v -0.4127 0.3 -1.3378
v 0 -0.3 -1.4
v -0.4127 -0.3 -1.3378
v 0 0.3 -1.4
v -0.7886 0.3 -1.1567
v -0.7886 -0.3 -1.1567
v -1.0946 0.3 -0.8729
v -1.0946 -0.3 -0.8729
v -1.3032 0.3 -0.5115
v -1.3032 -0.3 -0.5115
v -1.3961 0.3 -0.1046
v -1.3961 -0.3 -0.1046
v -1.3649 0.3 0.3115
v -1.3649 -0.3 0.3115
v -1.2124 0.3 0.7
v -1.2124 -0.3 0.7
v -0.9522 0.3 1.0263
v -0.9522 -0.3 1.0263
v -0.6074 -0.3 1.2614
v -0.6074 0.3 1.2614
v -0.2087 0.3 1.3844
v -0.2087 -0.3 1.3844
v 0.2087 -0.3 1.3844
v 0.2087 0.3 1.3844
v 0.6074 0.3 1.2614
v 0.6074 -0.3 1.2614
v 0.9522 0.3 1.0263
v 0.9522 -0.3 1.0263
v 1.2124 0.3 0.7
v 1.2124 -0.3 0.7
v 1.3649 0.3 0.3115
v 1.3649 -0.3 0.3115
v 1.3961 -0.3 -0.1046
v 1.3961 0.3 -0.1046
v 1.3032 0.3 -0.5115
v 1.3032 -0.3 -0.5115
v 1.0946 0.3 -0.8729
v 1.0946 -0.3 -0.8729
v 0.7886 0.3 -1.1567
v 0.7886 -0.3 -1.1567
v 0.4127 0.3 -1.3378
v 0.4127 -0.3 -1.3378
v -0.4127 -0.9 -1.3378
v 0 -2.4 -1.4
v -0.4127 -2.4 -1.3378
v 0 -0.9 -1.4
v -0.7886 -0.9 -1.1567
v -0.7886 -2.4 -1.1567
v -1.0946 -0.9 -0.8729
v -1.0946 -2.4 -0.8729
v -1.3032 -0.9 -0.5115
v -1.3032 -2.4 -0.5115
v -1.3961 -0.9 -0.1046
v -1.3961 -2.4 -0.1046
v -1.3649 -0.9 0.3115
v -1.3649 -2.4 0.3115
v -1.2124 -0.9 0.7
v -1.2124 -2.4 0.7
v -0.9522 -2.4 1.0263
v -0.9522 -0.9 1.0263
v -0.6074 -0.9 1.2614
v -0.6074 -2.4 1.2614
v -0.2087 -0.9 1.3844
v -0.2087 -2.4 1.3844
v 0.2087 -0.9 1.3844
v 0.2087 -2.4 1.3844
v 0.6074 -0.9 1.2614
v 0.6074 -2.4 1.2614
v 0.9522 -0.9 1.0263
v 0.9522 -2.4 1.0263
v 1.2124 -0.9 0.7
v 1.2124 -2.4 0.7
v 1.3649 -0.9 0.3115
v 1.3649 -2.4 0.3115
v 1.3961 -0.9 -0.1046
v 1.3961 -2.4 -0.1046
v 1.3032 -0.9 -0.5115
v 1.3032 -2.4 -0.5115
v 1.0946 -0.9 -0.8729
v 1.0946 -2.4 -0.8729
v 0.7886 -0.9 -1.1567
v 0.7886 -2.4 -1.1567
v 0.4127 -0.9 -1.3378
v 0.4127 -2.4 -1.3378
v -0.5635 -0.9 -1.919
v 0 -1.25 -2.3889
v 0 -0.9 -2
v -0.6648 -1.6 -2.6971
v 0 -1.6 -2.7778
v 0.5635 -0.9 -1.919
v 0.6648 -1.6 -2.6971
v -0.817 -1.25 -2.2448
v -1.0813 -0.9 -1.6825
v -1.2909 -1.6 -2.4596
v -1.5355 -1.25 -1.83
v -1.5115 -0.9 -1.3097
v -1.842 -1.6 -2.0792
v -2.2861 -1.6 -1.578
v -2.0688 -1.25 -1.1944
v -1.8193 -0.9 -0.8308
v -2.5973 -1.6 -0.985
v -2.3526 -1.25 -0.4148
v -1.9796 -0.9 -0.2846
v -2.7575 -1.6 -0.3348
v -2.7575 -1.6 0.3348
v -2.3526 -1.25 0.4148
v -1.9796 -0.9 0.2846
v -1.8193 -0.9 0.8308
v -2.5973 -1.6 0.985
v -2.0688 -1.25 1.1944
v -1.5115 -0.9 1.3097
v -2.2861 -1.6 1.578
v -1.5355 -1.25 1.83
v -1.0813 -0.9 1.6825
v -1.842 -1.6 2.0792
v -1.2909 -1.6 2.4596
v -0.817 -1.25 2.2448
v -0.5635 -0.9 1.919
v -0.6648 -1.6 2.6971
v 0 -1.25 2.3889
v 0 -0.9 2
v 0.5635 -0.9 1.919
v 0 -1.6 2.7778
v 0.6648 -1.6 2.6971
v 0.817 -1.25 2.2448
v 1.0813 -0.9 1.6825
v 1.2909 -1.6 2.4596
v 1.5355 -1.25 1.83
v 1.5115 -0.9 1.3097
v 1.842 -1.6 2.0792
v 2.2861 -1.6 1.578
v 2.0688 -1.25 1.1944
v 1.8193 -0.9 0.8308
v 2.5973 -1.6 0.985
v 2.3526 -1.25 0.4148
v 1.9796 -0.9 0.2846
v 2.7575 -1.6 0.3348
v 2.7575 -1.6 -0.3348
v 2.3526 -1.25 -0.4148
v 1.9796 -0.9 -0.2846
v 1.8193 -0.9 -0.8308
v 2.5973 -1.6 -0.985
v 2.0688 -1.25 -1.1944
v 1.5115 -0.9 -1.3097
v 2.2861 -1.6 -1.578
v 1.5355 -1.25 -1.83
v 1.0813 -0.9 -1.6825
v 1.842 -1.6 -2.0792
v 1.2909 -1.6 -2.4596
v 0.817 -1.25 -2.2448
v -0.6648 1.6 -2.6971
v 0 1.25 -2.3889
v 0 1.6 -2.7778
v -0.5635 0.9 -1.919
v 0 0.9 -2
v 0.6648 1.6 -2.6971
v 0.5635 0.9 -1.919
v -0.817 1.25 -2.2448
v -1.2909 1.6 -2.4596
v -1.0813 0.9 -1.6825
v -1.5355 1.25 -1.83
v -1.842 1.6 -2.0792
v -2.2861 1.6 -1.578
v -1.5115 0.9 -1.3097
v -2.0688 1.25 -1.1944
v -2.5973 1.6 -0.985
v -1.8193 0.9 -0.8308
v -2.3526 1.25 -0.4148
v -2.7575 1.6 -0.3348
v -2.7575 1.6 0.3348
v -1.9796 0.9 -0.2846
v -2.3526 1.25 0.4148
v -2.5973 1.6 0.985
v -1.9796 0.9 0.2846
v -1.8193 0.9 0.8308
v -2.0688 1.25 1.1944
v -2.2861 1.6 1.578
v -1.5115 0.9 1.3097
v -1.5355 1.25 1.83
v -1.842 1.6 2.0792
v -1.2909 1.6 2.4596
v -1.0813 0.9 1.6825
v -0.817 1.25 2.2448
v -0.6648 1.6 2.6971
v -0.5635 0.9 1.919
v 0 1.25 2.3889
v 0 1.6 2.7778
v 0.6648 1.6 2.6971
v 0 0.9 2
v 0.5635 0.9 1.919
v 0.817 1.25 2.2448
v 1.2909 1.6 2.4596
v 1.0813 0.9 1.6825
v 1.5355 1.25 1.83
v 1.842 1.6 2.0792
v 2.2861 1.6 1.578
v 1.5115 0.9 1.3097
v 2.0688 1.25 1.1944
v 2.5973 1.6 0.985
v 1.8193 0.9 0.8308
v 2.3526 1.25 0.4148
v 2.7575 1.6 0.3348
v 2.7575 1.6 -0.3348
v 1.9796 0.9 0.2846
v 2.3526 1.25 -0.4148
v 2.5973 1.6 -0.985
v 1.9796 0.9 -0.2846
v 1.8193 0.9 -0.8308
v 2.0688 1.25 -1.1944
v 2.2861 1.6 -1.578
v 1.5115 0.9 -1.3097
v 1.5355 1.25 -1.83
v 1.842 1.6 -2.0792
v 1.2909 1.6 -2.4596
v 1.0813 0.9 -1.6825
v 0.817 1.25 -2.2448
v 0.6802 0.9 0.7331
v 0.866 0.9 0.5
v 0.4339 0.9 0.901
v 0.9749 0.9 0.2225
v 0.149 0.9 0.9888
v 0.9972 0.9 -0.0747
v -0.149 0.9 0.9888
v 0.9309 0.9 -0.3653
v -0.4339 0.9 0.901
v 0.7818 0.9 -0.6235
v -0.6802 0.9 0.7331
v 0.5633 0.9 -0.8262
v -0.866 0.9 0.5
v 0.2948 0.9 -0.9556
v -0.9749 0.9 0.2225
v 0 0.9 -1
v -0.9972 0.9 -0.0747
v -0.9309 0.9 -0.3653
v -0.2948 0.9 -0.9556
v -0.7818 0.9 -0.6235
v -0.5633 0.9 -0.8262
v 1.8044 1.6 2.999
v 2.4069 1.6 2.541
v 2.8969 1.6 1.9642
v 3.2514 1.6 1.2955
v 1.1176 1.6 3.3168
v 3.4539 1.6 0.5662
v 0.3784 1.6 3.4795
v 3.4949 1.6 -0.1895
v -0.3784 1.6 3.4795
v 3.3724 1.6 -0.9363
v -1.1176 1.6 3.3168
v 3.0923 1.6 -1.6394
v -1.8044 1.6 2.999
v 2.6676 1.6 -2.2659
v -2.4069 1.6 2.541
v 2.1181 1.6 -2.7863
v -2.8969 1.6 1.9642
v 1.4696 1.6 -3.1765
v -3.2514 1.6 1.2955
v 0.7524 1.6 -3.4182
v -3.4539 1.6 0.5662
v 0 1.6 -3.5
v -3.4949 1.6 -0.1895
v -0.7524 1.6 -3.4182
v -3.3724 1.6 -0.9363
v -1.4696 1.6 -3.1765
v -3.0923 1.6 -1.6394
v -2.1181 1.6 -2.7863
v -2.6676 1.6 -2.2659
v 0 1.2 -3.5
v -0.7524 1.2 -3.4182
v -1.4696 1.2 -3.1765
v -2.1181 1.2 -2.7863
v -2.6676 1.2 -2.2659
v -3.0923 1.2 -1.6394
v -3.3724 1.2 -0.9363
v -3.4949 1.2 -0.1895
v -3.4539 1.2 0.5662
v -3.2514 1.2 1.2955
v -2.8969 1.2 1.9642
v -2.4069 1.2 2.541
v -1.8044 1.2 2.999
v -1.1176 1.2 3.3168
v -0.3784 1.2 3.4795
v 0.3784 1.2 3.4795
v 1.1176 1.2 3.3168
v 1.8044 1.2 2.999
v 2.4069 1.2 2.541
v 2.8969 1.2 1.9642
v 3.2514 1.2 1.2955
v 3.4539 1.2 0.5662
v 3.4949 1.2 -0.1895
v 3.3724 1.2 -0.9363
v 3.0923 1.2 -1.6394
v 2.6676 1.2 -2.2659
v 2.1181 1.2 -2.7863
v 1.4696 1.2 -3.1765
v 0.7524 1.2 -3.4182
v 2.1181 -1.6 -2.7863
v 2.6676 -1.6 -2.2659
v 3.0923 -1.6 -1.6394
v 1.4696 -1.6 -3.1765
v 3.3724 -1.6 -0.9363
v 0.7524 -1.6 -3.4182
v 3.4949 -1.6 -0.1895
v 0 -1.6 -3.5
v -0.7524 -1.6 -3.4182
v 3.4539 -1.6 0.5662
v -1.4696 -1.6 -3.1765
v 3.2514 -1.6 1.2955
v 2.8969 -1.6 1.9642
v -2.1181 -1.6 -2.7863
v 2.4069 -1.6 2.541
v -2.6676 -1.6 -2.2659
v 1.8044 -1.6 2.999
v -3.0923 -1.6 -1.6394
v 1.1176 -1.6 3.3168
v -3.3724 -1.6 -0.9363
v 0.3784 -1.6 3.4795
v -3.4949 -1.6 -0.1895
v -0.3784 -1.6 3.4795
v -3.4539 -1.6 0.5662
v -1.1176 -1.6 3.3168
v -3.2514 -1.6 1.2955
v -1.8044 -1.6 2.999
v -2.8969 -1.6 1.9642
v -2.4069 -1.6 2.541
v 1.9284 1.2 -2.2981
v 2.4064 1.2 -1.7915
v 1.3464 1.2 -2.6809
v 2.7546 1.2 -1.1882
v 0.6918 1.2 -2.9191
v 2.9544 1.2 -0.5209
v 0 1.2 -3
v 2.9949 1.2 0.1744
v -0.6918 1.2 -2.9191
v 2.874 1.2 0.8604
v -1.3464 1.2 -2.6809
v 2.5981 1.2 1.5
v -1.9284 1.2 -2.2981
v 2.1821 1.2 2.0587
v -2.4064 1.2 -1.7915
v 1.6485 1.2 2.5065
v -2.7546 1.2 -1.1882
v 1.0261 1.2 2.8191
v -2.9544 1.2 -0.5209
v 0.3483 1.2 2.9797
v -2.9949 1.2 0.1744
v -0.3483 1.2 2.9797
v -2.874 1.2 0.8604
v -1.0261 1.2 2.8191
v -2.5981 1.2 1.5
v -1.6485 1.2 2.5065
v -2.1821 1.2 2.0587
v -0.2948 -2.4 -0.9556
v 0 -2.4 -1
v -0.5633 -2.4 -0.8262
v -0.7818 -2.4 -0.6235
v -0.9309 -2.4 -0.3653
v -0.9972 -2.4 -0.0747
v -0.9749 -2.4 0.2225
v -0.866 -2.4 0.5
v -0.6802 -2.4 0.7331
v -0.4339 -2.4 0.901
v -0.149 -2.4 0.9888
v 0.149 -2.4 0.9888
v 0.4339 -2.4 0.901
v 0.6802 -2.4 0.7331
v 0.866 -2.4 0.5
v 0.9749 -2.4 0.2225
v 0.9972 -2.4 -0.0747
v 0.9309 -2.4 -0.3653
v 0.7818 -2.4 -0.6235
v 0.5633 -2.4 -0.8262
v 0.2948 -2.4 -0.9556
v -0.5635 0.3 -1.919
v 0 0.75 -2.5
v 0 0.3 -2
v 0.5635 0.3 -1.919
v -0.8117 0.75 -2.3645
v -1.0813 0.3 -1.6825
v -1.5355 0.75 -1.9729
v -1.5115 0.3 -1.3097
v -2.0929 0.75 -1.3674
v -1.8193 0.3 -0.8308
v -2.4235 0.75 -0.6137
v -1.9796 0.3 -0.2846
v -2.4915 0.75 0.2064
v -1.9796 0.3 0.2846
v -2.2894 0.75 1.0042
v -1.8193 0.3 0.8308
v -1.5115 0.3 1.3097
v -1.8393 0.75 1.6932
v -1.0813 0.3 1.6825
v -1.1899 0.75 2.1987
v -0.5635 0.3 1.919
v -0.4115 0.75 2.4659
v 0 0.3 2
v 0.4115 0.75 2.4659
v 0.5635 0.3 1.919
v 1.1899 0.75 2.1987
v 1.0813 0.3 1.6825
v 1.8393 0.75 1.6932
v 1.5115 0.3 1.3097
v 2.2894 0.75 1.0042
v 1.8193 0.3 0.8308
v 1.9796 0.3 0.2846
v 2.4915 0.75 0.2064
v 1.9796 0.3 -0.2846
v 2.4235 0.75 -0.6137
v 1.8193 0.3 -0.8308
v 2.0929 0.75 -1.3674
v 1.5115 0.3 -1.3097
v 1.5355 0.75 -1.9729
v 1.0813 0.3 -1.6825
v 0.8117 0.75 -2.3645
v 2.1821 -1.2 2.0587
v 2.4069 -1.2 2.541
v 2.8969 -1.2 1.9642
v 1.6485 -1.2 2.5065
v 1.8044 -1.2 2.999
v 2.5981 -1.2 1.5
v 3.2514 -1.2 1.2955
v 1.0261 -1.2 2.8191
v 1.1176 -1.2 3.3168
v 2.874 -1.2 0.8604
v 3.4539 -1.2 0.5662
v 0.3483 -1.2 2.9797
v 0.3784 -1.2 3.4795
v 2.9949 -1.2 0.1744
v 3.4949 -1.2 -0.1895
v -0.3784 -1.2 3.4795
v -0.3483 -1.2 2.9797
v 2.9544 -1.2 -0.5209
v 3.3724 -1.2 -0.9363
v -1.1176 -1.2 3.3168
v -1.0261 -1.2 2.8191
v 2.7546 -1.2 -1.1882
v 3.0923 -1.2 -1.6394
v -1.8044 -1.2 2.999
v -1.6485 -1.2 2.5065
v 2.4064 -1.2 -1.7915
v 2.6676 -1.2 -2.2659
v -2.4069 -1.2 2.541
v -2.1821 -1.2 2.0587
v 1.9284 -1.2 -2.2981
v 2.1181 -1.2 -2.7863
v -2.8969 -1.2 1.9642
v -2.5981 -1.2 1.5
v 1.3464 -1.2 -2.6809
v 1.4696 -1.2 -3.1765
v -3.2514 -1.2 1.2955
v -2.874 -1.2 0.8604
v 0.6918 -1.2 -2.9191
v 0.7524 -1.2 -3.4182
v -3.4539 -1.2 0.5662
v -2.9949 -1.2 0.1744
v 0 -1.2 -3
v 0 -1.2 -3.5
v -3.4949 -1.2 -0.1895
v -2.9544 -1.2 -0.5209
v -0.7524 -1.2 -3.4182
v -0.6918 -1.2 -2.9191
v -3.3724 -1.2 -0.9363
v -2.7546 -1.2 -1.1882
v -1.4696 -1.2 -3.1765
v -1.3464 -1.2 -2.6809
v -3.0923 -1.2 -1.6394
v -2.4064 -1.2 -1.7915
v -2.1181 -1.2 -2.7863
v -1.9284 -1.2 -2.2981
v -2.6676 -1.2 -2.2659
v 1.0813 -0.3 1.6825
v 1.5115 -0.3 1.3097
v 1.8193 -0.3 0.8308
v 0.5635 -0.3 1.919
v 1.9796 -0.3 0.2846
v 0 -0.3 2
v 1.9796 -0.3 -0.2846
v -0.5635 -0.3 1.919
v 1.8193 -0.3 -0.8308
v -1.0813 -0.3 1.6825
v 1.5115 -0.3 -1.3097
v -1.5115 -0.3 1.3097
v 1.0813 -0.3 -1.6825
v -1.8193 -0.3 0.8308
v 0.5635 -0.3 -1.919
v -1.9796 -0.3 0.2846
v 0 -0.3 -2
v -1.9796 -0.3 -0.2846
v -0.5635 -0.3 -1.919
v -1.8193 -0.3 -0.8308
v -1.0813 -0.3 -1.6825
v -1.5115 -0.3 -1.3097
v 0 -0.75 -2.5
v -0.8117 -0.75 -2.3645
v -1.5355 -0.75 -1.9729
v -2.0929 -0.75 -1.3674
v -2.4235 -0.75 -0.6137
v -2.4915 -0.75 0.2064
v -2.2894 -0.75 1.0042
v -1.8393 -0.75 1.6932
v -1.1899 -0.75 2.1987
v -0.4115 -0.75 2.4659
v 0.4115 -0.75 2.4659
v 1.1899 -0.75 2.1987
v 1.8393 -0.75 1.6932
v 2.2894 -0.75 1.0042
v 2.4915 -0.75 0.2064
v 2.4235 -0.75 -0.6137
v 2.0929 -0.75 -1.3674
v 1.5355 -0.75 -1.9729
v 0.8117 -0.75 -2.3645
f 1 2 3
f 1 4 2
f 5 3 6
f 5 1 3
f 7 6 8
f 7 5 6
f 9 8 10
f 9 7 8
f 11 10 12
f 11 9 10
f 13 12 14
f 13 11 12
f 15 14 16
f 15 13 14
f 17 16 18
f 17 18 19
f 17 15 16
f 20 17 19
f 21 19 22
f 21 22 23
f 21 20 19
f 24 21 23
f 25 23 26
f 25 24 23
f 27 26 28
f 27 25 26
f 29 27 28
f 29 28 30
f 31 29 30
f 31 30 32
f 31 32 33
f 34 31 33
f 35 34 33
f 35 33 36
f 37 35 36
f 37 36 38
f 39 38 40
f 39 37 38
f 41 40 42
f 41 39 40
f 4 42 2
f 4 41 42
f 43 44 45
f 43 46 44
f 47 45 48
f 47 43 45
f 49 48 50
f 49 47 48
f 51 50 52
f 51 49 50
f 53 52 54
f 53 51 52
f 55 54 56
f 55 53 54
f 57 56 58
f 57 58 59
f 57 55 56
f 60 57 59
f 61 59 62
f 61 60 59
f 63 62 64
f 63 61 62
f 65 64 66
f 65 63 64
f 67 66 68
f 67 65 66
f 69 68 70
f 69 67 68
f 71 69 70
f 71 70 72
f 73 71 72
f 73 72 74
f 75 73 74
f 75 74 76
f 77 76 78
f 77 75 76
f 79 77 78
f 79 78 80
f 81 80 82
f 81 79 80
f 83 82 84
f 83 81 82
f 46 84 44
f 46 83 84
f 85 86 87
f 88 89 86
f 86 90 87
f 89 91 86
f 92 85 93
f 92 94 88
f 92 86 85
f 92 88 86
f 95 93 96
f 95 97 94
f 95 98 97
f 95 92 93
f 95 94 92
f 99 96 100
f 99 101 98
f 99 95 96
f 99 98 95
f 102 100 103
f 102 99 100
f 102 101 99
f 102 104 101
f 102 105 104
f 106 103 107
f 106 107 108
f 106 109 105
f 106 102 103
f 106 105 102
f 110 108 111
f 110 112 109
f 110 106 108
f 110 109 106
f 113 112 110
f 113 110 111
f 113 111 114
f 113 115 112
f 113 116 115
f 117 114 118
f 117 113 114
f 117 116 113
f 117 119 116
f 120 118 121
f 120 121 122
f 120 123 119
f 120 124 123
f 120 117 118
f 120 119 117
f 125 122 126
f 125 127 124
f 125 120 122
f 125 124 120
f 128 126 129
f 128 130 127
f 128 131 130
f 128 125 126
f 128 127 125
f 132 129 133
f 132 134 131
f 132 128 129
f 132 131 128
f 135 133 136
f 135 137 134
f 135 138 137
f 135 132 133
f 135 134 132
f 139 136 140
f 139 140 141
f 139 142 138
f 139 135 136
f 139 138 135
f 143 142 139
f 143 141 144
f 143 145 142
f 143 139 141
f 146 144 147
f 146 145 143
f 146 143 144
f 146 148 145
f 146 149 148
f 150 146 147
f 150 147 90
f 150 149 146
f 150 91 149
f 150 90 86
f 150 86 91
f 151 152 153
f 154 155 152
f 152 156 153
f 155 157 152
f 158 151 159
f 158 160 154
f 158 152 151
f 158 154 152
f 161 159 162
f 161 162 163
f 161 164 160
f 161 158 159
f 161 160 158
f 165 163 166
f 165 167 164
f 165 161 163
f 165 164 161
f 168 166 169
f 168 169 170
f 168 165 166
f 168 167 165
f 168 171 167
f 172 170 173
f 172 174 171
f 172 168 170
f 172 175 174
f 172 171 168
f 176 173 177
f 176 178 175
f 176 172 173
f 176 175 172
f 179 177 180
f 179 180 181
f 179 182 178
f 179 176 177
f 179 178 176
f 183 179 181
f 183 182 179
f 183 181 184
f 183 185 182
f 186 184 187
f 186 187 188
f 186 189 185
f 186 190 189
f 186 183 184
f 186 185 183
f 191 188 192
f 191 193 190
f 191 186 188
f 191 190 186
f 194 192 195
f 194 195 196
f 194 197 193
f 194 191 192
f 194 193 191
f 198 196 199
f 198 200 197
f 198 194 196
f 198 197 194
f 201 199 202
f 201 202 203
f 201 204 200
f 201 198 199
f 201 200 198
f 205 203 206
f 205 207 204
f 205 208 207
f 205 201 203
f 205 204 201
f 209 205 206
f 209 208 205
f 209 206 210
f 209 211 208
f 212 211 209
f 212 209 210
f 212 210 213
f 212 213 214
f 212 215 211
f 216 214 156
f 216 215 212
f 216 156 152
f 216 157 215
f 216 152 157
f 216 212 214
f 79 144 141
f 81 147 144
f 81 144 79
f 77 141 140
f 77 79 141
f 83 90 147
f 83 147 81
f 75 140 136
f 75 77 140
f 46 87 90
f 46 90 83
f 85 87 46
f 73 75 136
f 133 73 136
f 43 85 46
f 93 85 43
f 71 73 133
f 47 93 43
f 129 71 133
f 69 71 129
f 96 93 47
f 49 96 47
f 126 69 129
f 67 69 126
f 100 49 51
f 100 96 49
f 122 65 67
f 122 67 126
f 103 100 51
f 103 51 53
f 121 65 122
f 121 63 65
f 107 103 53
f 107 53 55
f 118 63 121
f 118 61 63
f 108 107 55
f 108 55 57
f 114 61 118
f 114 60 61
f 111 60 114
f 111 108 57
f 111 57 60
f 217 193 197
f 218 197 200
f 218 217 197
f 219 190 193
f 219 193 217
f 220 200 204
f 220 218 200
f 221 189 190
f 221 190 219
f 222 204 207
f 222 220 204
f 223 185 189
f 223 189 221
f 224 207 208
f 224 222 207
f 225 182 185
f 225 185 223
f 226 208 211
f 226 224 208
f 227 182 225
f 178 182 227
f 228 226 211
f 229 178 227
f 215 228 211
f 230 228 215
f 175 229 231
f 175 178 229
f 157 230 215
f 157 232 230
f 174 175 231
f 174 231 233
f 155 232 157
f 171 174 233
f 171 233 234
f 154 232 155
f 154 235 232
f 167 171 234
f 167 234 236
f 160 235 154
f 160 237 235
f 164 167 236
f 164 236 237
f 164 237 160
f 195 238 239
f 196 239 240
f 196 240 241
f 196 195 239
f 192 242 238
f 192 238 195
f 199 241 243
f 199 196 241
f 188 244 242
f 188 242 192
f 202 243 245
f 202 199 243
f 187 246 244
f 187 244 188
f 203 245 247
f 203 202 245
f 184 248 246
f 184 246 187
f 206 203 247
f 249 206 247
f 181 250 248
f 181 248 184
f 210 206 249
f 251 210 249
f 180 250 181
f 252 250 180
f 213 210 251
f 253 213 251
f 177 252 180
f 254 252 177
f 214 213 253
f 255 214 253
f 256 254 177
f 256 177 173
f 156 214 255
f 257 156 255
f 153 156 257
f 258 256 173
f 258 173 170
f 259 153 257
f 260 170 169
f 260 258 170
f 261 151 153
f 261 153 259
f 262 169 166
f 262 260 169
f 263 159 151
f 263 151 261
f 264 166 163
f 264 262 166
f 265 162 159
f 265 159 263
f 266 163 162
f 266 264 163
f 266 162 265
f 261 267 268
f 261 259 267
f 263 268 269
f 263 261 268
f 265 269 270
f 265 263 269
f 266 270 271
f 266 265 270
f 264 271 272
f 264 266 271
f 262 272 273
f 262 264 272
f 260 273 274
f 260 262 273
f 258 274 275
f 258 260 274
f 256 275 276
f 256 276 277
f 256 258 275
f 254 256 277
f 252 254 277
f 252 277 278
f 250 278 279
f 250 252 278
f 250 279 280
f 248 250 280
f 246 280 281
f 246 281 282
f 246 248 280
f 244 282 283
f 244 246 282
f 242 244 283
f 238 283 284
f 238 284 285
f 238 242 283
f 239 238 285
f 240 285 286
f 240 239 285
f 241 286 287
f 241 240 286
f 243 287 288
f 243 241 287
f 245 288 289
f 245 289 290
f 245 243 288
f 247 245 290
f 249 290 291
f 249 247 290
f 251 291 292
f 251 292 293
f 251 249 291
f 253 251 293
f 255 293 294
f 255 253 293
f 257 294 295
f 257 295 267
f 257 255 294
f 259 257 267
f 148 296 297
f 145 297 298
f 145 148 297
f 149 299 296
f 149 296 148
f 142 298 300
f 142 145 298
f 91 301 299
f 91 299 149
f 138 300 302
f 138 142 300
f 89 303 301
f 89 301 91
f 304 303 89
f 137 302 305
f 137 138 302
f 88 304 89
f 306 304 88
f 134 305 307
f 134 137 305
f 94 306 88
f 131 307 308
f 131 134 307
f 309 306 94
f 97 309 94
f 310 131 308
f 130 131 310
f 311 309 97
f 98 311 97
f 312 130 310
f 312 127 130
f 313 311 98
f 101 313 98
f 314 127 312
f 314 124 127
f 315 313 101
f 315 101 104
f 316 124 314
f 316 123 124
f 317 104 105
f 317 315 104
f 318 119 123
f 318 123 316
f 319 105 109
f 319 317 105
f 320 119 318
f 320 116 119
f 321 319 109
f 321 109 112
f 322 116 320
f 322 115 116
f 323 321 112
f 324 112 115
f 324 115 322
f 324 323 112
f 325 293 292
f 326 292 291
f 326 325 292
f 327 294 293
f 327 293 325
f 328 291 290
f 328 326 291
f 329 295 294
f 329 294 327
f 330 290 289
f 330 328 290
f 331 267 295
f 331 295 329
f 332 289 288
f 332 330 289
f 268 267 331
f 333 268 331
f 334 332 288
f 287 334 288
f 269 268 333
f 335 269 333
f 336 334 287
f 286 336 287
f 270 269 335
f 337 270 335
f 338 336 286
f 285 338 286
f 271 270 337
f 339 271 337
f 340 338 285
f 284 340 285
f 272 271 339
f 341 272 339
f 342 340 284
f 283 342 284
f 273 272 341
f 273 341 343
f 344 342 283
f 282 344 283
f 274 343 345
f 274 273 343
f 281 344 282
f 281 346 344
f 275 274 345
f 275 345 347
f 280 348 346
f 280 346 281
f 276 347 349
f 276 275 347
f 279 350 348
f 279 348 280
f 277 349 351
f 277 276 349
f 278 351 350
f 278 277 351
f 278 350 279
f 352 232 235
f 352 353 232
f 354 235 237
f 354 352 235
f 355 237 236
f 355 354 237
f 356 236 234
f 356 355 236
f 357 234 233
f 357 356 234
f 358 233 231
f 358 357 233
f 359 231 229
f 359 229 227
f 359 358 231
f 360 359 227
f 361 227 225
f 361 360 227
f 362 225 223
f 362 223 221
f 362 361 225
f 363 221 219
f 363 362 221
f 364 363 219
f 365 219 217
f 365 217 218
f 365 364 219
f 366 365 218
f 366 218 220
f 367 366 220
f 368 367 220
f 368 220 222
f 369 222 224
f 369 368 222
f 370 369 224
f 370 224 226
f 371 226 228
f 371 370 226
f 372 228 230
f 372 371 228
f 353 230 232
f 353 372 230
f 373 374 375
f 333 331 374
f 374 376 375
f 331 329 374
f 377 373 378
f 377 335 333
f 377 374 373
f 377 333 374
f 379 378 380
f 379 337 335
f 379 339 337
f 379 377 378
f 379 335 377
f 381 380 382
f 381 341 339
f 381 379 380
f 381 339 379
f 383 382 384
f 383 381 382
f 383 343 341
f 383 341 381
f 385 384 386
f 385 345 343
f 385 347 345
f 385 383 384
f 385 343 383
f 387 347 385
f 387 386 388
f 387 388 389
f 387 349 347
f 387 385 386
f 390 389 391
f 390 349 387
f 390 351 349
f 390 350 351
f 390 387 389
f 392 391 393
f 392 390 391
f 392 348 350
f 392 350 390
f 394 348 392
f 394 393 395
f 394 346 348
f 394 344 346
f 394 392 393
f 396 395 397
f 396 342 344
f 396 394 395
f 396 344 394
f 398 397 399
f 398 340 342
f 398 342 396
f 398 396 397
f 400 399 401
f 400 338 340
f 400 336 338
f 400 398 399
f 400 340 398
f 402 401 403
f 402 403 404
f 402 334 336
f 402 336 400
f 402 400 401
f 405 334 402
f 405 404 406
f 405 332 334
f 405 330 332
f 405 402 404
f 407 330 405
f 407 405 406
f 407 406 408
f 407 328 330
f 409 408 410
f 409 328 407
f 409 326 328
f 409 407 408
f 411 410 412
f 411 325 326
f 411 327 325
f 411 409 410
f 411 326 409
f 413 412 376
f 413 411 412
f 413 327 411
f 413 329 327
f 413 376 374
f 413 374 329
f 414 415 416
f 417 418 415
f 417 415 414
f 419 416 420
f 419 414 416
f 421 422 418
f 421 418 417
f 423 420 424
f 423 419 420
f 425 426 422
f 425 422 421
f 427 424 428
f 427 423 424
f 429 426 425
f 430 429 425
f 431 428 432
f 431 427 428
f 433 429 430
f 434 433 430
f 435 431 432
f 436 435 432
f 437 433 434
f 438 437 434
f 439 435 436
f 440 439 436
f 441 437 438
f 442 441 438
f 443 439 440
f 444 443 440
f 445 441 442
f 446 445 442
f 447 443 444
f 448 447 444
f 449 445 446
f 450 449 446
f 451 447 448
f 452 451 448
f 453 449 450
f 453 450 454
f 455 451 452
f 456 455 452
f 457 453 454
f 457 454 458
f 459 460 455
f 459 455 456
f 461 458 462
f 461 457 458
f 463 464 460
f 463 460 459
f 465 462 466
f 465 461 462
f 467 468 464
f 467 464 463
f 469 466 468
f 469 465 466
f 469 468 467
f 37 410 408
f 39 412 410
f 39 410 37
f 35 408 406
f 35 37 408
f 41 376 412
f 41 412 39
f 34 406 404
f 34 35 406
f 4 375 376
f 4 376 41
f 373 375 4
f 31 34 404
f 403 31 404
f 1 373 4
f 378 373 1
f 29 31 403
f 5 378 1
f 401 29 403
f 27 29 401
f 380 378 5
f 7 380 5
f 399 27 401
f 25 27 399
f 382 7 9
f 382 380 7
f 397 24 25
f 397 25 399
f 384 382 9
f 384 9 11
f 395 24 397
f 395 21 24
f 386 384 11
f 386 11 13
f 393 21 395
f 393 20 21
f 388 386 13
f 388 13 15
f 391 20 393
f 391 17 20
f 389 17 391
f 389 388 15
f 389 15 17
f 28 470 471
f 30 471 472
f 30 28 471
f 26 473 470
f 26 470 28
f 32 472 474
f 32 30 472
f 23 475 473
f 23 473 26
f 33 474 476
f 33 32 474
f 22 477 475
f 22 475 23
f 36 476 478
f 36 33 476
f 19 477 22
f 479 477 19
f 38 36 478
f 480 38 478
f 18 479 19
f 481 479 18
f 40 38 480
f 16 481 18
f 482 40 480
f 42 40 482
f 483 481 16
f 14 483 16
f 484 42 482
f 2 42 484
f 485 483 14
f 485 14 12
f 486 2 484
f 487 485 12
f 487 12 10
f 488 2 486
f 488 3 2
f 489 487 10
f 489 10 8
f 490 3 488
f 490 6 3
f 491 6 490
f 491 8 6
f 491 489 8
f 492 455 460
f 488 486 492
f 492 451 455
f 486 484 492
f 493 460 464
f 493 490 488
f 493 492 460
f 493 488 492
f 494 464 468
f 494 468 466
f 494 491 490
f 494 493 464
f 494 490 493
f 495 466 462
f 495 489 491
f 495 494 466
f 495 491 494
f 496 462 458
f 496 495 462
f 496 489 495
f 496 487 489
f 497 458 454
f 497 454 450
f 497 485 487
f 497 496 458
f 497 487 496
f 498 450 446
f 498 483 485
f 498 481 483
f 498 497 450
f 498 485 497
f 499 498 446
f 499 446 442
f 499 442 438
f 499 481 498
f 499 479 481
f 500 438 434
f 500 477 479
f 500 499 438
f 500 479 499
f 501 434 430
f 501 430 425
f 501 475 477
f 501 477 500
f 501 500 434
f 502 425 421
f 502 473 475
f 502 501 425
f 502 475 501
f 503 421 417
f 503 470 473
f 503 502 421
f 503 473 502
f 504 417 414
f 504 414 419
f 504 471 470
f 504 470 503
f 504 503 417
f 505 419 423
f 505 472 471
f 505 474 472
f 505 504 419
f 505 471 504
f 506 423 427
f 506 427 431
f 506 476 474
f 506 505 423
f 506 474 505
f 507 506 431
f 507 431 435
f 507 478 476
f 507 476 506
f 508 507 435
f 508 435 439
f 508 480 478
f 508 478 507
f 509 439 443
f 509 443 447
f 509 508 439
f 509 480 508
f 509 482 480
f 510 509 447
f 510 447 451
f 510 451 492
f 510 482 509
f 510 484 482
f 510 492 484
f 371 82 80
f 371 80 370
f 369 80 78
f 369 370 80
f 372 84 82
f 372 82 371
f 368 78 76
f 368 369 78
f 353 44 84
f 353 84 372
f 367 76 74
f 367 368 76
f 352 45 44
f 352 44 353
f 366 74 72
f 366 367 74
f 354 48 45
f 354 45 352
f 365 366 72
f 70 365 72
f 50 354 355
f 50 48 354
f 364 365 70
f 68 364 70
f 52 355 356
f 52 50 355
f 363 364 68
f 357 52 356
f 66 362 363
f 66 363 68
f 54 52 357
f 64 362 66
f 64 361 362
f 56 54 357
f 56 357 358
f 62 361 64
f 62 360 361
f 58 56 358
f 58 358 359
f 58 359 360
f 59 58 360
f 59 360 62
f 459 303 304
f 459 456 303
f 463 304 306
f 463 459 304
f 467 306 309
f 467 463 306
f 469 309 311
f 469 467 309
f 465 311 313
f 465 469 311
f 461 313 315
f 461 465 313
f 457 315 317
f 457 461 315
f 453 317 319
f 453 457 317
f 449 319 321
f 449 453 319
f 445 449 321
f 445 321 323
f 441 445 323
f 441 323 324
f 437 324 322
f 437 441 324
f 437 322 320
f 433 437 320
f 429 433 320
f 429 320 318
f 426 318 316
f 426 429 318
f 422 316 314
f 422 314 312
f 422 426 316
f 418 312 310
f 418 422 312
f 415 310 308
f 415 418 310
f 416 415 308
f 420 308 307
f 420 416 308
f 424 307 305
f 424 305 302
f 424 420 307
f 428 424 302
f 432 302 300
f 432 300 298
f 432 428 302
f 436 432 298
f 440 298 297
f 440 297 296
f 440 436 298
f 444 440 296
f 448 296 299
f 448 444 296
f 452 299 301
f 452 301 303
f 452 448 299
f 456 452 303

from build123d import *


with BuildPart() as part:
    # Esquisse1 → Révolution1 (revolve)
    with BuildSketch(Plane.XY, mode=Mode.PRIVATE) as r_volution1_sk:
        Polygon((2.777777778, -1.6), (3.5, -1.6), (3.5, -1.2), (3, -1.2), (2, -0.3), (1.4, -0.3), (1.4, 0.3), (2, 0.3), (3, 1.2), (3.5, 1.2), (3.5, 1.6), (2.777777778, 1.6), (2, 0.9), (1, 0.9), (1, -2.4), (1.4, -2.4), (1.4, -0.9), (2, -0.9), align=None)
    revolve(r_volution1_sk.sketch.rotate(Axis((0, 0, 0), (0, 1, 0)), 90), axis=Axis((0, 0, 0), (0, 1, 0)))


solid = part.part
